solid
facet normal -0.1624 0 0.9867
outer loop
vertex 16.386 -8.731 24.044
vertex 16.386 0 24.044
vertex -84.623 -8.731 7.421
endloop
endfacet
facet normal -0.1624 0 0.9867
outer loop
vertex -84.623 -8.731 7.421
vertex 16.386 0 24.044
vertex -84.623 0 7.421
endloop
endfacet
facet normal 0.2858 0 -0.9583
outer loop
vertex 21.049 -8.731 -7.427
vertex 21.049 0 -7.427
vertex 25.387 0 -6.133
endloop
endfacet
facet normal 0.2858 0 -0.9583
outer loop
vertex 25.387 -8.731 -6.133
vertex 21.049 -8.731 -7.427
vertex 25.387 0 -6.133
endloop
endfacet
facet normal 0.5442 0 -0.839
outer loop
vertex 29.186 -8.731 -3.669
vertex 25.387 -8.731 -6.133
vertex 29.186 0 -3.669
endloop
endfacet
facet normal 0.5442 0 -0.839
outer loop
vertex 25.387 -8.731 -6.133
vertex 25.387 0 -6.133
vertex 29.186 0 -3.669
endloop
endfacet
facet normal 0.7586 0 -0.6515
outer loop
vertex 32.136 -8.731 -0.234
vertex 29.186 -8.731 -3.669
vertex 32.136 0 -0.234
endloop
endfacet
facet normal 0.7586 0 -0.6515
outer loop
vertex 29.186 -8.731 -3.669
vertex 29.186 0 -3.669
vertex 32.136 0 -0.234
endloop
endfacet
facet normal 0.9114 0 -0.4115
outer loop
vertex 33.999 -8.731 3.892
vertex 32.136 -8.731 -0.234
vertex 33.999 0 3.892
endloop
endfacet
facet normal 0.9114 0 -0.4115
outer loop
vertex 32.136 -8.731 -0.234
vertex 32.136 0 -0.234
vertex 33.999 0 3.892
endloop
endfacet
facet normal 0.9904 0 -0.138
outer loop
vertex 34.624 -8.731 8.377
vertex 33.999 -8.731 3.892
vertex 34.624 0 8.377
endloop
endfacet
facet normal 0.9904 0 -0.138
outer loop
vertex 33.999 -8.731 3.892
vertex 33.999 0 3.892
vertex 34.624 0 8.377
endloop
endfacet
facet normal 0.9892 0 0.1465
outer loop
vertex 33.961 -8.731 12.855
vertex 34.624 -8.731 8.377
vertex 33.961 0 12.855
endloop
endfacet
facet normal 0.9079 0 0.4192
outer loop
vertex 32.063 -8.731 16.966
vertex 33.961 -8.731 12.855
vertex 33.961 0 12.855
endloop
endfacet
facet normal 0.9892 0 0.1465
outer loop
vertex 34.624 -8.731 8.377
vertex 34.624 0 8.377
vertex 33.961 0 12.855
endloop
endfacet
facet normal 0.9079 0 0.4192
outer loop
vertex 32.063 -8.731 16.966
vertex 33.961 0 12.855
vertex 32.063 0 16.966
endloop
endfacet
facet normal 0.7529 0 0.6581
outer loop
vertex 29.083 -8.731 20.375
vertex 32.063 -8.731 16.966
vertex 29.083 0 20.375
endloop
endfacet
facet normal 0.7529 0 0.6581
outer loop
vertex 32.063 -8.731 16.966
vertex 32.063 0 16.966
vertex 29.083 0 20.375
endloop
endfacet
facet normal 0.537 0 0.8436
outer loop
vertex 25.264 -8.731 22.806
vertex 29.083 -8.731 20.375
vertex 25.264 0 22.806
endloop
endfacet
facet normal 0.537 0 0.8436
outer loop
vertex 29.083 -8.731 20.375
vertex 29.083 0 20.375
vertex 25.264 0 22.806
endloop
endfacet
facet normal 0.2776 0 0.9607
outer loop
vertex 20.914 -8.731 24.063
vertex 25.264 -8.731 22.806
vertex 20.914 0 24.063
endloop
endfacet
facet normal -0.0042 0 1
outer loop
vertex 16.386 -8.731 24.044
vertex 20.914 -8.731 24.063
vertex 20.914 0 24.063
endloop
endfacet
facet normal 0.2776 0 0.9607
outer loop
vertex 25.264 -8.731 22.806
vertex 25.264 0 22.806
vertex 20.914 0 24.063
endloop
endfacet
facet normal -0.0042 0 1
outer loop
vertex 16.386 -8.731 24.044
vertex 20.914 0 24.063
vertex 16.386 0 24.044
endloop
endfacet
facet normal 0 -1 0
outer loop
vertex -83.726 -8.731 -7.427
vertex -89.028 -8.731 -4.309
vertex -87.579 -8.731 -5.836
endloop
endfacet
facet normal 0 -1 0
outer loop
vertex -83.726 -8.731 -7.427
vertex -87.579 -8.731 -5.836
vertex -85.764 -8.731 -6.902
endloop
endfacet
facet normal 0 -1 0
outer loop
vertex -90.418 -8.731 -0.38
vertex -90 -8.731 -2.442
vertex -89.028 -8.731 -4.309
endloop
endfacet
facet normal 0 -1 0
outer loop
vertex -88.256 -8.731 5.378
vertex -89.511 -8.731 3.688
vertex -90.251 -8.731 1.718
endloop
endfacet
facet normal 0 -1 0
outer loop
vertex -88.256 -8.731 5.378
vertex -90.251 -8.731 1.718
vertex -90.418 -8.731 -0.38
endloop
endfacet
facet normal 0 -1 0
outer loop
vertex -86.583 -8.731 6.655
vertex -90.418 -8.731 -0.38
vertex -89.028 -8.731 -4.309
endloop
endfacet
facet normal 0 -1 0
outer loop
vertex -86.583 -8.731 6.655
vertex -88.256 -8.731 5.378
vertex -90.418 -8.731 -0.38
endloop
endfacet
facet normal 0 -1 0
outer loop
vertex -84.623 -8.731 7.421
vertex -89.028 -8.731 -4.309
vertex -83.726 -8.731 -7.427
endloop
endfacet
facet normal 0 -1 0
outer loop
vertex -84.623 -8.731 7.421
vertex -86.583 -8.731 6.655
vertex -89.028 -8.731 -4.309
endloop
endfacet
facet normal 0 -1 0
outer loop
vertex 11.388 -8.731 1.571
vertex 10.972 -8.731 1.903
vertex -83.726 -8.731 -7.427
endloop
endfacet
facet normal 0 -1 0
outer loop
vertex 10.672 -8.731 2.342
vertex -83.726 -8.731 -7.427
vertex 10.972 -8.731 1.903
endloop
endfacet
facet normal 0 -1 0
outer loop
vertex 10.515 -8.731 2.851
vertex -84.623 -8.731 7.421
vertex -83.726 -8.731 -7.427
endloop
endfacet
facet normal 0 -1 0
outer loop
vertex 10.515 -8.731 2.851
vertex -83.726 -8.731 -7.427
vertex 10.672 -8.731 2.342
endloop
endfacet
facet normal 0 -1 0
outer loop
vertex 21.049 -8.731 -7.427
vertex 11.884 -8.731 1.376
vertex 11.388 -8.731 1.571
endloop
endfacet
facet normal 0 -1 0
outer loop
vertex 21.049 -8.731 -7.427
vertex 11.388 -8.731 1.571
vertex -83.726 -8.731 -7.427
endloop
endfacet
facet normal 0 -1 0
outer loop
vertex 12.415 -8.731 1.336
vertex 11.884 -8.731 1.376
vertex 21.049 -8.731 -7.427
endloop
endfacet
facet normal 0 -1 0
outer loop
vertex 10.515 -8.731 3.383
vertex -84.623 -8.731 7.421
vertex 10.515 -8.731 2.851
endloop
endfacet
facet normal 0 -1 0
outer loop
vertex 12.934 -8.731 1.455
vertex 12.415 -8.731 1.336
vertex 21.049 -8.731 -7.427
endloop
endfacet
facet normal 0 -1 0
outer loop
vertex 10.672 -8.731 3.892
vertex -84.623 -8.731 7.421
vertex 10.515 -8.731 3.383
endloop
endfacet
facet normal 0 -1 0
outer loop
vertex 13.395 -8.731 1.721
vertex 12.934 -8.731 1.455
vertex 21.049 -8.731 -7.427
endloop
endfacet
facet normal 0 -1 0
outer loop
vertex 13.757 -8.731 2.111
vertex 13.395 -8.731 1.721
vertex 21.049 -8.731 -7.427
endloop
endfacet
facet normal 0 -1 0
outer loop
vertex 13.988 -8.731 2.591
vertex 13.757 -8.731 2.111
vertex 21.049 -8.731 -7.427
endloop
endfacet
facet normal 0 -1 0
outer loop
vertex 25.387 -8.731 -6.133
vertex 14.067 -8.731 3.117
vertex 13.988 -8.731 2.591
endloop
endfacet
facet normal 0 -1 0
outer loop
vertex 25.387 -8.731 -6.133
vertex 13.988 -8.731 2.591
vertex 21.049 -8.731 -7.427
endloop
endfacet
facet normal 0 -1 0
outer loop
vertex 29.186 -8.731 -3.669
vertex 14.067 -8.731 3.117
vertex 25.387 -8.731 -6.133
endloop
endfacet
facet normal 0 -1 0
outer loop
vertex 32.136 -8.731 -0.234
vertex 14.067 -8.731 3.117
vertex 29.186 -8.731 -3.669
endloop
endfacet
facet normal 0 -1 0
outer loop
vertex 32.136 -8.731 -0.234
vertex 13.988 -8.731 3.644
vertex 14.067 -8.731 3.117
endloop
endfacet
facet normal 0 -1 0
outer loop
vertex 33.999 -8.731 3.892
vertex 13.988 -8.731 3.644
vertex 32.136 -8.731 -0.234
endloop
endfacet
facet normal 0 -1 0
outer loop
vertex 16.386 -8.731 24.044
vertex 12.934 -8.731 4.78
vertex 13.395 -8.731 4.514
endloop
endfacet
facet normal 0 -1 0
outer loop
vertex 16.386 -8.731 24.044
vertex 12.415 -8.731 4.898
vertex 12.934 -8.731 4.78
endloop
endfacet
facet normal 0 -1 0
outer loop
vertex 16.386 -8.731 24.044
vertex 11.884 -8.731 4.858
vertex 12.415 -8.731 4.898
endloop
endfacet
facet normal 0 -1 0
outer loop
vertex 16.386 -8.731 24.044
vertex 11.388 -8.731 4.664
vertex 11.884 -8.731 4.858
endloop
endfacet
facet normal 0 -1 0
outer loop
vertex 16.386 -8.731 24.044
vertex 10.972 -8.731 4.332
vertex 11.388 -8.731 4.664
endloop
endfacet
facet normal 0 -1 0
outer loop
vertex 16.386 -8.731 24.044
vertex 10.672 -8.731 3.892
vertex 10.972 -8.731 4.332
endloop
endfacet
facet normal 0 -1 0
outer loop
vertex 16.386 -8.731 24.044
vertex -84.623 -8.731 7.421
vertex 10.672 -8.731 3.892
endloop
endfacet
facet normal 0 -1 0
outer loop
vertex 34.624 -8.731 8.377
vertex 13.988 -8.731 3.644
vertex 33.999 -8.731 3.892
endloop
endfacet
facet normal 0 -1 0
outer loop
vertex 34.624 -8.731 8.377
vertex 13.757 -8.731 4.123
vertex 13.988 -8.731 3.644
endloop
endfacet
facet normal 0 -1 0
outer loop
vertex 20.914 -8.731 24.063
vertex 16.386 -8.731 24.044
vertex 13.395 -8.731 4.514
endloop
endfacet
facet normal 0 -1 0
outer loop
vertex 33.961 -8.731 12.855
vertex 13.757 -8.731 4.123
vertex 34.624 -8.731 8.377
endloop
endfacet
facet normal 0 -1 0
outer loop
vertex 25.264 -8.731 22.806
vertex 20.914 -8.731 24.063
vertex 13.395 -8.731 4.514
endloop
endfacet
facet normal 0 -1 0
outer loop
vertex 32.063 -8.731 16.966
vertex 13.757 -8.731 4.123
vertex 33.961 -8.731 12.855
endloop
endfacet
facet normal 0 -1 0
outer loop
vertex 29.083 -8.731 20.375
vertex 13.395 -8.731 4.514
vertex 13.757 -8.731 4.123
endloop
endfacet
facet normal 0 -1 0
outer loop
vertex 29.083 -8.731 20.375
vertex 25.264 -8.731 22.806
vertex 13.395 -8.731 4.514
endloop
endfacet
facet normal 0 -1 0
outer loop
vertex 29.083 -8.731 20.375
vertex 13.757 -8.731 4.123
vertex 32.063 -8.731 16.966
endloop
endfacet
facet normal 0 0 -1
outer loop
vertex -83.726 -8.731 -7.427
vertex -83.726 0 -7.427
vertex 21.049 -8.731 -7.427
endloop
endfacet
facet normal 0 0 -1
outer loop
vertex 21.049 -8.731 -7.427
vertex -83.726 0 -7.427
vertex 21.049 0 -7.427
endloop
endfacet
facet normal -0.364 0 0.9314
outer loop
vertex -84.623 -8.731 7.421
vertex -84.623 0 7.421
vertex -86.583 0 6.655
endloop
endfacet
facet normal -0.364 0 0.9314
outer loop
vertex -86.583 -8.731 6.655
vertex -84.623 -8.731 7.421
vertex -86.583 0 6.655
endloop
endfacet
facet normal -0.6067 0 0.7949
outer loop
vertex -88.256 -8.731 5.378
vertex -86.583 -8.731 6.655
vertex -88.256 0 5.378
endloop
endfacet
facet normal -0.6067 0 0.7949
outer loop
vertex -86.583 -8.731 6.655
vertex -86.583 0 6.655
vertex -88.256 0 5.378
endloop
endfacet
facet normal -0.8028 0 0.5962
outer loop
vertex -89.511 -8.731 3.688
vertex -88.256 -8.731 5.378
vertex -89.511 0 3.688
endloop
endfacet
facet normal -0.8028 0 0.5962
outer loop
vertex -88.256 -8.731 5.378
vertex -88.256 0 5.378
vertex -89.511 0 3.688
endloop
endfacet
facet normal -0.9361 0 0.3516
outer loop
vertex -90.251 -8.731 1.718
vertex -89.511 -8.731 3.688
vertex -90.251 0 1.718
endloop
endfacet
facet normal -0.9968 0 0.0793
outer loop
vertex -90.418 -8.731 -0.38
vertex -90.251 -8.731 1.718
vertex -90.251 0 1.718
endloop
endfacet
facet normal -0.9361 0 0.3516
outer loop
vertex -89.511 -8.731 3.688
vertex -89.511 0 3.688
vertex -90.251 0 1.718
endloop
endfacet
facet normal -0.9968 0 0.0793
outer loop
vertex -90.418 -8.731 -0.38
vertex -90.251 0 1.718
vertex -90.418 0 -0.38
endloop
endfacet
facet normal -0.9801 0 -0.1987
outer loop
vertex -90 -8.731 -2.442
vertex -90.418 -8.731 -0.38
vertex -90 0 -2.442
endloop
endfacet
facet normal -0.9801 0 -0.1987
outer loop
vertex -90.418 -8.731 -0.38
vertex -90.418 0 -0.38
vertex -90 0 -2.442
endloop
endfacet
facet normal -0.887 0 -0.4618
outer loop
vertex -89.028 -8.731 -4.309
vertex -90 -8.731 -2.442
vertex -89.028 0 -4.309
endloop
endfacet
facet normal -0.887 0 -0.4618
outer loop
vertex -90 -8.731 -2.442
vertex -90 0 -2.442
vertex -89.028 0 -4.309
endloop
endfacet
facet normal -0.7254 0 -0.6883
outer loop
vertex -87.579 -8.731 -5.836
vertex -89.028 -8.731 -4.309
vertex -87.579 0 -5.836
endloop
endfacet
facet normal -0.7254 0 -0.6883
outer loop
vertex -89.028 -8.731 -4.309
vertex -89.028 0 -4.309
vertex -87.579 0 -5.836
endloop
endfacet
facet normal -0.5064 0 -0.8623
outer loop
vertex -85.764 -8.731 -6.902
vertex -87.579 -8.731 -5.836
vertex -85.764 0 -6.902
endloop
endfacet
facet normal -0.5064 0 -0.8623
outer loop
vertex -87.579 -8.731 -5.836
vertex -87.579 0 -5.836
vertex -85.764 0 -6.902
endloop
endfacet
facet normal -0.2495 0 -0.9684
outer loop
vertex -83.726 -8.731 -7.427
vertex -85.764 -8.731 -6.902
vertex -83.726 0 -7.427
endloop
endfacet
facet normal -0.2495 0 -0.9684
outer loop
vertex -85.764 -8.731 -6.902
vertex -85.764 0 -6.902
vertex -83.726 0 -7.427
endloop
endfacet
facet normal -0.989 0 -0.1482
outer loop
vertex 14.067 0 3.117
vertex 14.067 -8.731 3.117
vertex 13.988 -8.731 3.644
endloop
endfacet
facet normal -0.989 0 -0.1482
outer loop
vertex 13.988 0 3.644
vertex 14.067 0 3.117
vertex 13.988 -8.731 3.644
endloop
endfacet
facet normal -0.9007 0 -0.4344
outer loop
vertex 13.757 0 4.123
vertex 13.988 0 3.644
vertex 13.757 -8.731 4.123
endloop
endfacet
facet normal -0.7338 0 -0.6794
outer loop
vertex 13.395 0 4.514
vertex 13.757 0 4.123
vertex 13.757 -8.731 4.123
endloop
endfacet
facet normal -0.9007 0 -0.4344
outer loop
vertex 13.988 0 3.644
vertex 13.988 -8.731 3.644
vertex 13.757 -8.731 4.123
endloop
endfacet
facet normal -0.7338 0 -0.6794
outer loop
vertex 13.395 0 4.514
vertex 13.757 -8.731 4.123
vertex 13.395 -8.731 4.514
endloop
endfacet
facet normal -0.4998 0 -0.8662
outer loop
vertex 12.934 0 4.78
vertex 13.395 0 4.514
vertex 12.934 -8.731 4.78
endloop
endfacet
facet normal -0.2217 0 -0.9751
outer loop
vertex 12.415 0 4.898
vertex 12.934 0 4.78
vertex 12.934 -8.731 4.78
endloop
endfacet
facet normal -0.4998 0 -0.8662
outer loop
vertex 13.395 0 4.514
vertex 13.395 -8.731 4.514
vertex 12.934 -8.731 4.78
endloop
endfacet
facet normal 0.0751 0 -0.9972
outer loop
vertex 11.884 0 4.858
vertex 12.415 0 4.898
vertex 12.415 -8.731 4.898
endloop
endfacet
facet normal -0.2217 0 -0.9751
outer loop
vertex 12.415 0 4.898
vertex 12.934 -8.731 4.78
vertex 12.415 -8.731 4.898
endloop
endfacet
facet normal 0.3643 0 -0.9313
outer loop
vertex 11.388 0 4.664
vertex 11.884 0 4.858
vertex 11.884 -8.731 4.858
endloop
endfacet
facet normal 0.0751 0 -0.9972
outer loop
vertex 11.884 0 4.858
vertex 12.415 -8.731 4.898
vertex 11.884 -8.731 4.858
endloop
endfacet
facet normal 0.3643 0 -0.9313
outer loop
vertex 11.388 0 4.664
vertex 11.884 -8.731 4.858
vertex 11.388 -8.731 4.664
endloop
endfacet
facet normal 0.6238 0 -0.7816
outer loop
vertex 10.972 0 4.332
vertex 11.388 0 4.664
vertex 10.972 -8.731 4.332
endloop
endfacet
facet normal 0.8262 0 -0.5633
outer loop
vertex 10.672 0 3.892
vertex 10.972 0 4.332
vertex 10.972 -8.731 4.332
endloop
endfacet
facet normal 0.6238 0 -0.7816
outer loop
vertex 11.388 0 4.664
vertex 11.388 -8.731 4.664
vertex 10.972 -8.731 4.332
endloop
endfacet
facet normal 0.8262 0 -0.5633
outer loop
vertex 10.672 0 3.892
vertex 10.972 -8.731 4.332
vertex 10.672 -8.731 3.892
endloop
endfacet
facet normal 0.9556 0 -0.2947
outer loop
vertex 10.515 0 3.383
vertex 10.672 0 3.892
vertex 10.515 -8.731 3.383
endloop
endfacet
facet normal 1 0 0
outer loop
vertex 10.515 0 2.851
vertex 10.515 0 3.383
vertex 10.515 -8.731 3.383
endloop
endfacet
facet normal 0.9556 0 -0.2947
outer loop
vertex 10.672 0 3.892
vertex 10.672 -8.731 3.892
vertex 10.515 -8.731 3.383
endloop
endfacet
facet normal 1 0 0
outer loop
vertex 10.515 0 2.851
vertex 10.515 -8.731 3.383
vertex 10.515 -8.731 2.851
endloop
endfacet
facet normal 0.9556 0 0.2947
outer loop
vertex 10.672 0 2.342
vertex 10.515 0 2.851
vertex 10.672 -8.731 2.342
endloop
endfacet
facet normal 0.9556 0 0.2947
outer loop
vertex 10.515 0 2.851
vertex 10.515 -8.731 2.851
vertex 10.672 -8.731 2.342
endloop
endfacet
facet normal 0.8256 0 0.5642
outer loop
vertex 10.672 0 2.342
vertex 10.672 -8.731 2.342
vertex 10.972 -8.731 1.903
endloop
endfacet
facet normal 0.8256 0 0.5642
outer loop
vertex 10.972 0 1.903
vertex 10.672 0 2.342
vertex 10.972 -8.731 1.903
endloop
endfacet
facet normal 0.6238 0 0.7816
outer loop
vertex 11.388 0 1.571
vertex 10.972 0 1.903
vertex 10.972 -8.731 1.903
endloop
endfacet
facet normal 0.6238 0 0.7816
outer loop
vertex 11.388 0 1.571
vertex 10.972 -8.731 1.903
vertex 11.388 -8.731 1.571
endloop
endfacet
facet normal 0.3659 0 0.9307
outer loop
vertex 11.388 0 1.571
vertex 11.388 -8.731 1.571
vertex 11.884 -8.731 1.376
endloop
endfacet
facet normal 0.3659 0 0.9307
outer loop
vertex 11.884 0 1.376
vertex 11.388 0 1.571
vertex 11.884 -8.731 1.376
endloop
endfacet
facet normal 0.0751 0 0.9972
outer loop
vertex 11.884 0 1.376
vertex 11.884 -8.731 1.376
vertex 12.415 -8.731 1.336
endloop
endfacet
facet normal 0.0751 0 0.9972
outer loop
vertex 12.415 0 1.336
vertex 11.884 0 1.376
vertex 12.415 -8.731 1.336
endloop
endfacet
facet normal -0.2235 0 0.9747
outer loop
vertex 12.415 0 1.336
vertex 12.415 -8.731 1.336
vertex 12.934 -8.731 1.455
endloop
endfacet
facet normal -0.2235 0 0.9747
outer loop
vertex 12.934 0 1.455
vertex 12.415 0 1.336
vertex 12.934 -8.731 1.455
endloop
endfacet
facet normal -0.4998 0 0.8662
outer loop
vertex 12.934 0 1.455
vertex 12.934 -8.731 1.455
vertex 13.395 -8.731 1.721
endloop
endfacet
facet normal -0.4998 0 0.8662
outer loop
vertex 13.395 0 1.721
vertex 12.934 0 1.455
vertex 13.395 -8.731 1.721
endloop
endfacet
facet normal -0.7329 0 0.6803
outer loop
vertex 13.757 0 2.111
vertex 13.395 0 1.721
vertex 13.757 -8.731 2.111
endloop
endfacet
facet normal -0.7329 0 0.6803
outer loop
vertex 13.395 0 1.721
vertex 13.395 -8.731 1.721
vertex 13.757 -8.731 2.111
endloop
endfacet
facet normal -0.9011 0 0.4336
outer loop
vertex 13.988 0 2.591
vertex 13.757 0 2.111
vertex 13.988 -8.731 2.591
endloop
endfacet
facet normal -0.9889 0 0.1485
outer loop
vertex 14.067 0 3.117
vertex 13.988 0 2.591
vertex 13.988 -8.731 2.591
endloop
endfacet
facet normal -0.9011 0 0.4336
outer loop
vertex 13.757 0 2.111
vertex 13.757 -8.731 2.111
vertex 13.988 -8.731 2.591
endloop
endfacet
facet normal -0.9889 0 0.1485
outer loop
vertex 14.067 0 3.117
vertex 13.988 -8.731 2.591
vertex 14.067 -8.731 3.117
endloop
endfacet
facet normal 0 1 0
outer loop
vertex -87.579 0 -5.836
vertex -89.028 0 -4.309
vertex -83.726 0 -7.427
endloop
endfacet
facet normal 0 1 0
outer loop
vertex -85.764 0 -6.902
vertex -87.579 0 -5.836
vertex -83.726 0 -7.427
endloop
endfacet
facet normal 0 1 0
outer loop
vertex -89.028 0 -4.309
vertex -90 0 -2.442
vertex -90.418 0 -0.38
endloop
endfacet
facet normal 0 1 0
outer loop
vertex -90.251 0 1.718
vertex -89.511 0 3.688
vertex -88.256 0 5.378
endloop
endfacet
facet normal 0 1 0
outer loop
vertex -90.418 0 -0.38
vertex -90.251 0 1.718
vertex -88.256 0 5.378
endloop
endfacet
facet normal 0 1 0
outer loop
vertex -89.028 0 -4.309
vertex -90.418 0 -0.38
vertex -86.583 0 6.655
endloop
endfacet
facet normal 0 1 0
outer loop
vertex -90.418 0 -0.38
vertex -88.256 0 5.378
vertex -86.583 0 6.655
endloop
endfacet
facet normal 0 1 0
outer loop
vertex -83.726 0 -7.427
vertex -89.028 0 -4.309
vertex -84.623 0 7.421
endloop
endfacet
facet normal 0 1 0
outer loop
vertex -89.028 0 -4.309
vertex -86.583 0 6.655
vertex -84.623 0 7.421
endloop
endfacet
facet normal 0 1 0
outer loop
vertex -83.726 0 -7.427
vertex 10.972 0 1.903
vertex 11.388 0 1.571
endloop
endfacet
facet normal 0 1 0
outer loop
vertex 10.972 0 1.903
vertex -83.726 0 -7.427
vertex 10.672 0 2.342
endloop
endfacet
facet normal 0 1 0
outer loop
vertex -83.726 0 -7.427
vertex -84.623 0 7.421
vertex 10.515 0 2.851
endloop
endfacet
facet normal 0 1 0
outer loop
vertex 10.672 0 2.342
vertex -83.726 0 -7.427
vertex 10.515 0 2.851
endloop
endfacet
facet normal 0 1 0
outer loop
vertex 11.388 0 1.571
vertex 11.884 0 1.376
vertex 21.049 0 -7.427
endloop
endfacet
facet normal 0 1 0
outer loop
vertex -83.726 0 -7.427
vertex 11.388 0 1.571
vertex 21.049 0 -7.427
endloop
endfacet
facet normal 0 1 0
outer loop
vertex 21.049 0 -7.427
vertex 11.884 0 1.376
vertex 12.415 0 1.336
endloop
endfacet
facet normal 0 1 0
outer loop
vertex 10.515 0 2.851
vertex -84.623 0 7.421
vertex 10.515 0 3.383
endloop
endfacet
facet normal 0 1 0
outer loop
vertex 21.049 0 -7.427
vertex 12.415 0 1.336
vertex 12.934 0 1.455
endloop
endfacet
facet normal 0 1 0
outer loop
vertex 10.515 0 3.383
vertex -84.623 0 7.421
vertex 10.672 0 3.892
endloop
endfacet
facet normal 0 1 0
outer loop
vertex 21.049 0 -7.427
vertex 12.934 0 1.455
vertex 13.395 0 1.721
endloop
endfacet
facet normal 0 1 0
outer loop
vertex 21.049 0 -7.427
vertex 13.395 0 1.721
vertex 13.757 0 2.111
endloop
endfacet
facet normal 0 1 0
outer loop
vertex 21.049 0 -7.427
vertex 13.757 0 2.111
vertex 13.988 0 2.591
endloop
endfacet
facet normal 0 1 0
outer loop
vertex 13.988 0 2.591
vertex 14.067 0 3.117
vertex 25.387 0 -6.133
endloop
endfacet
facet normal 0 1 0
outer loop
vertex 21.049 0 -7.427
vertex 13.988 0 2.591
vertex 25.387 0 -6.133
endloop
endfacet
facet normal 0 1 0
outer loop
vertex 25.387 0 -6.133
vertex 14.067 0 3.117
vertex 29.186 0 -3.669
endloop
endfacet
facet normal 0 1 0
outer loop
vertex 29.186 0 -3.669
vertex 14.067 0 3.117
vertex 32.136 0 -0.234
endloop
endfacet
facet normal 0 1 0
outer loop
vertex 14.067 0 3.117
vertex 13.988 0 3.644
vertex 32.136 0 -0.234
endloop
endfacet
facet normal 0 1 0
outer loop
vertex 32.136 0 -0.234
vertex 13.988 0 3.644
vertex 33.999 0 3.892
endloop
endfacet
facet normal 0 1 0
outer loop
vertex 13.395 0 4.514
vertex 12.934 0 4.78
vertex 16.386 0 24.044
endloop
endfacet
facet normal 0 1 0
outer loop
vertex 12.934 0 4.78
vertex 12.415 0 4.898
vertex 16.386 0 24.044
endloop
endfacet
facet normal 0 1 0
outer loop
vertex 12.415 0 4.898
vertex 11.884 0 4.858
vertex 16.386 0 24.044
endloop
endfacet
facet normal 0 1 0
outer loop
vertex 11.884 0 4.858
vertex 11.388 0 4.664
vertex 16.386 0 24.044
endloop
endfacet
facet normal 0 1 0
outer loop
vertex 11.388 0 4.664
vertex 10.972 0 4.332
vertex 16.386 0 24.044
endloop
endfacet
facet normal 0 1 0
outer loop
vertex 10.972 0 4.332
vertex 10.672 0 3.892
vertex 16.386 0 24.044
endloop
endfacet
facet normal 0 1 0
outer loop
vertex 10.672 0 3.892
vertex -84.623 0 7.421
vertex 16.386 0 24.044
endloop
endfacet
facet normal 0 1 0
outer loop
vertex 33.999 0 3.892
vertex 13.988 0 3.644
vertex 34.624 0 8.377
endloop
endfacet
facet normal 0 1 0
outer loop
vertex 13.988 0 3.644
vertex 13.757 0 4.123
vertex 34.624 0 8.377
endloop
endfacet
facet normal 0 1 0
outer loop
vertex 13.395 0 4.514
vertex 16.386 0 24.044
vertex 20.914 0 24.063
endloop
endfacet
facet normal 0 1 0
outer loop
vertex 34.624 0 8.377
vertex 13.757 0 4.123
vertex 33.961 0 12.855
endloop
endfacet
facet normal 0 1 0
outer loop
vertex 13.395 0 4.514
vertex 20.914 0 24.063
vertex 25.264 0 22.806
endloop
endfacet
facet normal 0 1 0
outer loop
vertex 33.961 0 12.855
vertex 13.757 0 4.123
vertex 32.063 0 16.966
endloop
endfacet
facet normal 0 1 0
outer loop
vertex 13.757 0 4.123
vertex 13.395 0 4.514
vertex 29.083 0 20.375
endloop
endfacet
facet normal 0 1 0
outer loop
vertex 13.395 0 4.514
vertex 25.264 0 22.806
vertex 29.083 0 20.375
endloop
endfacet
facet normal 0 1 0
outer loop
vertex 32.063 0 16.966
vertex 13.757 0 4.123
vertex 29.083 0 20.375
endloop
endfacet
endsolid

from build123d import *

# Parameters (mm, degrees)
F1_DEPTH = 8.73125
F2_R     = 1.7859375
F3_DEPTH = 8.73125


# Not quite as in the source:
# - a length typed as a fraction of an inch, garbled in the dataset ("3 / 203.2 mm" for 3/8 in), is restored


with BuildPart() as f1:
    # F0 (on Front) → F1 (new body)
    with BuildSketch(Plane.XZ):
        with BuildLine():
            Line((16.3863981424, 24.04380231), (-84.6225991332, 7.4210920542))
            ThreePointArc((-84.6225991332, 7.4210920542), (-90.4179458573, -0.3797760525), (-83.7262291187, -7.42679769))
            Line((-83.7262291187, -7.42679769), (21.0487708813, -7.42679769))
            ThreePointArc((21.0487708813, -7.42679769), (34.4528845118, 10.6396886794), (16.3863981424, 24.04380231))
        make_face()
    extrude(amount=F1_DEPTH)

    # F2 (on face) → F3 (cut, through all)
    with BuildSketch(Plane.XZ.offset(8.73125)):
        with Locations((12.2811356559, 3.1172726303)):
            Circle(F2_R)
    extrude(amount=-F3_DEPTH, mode=Mode.SUBTRACT)


solid = f1.part
